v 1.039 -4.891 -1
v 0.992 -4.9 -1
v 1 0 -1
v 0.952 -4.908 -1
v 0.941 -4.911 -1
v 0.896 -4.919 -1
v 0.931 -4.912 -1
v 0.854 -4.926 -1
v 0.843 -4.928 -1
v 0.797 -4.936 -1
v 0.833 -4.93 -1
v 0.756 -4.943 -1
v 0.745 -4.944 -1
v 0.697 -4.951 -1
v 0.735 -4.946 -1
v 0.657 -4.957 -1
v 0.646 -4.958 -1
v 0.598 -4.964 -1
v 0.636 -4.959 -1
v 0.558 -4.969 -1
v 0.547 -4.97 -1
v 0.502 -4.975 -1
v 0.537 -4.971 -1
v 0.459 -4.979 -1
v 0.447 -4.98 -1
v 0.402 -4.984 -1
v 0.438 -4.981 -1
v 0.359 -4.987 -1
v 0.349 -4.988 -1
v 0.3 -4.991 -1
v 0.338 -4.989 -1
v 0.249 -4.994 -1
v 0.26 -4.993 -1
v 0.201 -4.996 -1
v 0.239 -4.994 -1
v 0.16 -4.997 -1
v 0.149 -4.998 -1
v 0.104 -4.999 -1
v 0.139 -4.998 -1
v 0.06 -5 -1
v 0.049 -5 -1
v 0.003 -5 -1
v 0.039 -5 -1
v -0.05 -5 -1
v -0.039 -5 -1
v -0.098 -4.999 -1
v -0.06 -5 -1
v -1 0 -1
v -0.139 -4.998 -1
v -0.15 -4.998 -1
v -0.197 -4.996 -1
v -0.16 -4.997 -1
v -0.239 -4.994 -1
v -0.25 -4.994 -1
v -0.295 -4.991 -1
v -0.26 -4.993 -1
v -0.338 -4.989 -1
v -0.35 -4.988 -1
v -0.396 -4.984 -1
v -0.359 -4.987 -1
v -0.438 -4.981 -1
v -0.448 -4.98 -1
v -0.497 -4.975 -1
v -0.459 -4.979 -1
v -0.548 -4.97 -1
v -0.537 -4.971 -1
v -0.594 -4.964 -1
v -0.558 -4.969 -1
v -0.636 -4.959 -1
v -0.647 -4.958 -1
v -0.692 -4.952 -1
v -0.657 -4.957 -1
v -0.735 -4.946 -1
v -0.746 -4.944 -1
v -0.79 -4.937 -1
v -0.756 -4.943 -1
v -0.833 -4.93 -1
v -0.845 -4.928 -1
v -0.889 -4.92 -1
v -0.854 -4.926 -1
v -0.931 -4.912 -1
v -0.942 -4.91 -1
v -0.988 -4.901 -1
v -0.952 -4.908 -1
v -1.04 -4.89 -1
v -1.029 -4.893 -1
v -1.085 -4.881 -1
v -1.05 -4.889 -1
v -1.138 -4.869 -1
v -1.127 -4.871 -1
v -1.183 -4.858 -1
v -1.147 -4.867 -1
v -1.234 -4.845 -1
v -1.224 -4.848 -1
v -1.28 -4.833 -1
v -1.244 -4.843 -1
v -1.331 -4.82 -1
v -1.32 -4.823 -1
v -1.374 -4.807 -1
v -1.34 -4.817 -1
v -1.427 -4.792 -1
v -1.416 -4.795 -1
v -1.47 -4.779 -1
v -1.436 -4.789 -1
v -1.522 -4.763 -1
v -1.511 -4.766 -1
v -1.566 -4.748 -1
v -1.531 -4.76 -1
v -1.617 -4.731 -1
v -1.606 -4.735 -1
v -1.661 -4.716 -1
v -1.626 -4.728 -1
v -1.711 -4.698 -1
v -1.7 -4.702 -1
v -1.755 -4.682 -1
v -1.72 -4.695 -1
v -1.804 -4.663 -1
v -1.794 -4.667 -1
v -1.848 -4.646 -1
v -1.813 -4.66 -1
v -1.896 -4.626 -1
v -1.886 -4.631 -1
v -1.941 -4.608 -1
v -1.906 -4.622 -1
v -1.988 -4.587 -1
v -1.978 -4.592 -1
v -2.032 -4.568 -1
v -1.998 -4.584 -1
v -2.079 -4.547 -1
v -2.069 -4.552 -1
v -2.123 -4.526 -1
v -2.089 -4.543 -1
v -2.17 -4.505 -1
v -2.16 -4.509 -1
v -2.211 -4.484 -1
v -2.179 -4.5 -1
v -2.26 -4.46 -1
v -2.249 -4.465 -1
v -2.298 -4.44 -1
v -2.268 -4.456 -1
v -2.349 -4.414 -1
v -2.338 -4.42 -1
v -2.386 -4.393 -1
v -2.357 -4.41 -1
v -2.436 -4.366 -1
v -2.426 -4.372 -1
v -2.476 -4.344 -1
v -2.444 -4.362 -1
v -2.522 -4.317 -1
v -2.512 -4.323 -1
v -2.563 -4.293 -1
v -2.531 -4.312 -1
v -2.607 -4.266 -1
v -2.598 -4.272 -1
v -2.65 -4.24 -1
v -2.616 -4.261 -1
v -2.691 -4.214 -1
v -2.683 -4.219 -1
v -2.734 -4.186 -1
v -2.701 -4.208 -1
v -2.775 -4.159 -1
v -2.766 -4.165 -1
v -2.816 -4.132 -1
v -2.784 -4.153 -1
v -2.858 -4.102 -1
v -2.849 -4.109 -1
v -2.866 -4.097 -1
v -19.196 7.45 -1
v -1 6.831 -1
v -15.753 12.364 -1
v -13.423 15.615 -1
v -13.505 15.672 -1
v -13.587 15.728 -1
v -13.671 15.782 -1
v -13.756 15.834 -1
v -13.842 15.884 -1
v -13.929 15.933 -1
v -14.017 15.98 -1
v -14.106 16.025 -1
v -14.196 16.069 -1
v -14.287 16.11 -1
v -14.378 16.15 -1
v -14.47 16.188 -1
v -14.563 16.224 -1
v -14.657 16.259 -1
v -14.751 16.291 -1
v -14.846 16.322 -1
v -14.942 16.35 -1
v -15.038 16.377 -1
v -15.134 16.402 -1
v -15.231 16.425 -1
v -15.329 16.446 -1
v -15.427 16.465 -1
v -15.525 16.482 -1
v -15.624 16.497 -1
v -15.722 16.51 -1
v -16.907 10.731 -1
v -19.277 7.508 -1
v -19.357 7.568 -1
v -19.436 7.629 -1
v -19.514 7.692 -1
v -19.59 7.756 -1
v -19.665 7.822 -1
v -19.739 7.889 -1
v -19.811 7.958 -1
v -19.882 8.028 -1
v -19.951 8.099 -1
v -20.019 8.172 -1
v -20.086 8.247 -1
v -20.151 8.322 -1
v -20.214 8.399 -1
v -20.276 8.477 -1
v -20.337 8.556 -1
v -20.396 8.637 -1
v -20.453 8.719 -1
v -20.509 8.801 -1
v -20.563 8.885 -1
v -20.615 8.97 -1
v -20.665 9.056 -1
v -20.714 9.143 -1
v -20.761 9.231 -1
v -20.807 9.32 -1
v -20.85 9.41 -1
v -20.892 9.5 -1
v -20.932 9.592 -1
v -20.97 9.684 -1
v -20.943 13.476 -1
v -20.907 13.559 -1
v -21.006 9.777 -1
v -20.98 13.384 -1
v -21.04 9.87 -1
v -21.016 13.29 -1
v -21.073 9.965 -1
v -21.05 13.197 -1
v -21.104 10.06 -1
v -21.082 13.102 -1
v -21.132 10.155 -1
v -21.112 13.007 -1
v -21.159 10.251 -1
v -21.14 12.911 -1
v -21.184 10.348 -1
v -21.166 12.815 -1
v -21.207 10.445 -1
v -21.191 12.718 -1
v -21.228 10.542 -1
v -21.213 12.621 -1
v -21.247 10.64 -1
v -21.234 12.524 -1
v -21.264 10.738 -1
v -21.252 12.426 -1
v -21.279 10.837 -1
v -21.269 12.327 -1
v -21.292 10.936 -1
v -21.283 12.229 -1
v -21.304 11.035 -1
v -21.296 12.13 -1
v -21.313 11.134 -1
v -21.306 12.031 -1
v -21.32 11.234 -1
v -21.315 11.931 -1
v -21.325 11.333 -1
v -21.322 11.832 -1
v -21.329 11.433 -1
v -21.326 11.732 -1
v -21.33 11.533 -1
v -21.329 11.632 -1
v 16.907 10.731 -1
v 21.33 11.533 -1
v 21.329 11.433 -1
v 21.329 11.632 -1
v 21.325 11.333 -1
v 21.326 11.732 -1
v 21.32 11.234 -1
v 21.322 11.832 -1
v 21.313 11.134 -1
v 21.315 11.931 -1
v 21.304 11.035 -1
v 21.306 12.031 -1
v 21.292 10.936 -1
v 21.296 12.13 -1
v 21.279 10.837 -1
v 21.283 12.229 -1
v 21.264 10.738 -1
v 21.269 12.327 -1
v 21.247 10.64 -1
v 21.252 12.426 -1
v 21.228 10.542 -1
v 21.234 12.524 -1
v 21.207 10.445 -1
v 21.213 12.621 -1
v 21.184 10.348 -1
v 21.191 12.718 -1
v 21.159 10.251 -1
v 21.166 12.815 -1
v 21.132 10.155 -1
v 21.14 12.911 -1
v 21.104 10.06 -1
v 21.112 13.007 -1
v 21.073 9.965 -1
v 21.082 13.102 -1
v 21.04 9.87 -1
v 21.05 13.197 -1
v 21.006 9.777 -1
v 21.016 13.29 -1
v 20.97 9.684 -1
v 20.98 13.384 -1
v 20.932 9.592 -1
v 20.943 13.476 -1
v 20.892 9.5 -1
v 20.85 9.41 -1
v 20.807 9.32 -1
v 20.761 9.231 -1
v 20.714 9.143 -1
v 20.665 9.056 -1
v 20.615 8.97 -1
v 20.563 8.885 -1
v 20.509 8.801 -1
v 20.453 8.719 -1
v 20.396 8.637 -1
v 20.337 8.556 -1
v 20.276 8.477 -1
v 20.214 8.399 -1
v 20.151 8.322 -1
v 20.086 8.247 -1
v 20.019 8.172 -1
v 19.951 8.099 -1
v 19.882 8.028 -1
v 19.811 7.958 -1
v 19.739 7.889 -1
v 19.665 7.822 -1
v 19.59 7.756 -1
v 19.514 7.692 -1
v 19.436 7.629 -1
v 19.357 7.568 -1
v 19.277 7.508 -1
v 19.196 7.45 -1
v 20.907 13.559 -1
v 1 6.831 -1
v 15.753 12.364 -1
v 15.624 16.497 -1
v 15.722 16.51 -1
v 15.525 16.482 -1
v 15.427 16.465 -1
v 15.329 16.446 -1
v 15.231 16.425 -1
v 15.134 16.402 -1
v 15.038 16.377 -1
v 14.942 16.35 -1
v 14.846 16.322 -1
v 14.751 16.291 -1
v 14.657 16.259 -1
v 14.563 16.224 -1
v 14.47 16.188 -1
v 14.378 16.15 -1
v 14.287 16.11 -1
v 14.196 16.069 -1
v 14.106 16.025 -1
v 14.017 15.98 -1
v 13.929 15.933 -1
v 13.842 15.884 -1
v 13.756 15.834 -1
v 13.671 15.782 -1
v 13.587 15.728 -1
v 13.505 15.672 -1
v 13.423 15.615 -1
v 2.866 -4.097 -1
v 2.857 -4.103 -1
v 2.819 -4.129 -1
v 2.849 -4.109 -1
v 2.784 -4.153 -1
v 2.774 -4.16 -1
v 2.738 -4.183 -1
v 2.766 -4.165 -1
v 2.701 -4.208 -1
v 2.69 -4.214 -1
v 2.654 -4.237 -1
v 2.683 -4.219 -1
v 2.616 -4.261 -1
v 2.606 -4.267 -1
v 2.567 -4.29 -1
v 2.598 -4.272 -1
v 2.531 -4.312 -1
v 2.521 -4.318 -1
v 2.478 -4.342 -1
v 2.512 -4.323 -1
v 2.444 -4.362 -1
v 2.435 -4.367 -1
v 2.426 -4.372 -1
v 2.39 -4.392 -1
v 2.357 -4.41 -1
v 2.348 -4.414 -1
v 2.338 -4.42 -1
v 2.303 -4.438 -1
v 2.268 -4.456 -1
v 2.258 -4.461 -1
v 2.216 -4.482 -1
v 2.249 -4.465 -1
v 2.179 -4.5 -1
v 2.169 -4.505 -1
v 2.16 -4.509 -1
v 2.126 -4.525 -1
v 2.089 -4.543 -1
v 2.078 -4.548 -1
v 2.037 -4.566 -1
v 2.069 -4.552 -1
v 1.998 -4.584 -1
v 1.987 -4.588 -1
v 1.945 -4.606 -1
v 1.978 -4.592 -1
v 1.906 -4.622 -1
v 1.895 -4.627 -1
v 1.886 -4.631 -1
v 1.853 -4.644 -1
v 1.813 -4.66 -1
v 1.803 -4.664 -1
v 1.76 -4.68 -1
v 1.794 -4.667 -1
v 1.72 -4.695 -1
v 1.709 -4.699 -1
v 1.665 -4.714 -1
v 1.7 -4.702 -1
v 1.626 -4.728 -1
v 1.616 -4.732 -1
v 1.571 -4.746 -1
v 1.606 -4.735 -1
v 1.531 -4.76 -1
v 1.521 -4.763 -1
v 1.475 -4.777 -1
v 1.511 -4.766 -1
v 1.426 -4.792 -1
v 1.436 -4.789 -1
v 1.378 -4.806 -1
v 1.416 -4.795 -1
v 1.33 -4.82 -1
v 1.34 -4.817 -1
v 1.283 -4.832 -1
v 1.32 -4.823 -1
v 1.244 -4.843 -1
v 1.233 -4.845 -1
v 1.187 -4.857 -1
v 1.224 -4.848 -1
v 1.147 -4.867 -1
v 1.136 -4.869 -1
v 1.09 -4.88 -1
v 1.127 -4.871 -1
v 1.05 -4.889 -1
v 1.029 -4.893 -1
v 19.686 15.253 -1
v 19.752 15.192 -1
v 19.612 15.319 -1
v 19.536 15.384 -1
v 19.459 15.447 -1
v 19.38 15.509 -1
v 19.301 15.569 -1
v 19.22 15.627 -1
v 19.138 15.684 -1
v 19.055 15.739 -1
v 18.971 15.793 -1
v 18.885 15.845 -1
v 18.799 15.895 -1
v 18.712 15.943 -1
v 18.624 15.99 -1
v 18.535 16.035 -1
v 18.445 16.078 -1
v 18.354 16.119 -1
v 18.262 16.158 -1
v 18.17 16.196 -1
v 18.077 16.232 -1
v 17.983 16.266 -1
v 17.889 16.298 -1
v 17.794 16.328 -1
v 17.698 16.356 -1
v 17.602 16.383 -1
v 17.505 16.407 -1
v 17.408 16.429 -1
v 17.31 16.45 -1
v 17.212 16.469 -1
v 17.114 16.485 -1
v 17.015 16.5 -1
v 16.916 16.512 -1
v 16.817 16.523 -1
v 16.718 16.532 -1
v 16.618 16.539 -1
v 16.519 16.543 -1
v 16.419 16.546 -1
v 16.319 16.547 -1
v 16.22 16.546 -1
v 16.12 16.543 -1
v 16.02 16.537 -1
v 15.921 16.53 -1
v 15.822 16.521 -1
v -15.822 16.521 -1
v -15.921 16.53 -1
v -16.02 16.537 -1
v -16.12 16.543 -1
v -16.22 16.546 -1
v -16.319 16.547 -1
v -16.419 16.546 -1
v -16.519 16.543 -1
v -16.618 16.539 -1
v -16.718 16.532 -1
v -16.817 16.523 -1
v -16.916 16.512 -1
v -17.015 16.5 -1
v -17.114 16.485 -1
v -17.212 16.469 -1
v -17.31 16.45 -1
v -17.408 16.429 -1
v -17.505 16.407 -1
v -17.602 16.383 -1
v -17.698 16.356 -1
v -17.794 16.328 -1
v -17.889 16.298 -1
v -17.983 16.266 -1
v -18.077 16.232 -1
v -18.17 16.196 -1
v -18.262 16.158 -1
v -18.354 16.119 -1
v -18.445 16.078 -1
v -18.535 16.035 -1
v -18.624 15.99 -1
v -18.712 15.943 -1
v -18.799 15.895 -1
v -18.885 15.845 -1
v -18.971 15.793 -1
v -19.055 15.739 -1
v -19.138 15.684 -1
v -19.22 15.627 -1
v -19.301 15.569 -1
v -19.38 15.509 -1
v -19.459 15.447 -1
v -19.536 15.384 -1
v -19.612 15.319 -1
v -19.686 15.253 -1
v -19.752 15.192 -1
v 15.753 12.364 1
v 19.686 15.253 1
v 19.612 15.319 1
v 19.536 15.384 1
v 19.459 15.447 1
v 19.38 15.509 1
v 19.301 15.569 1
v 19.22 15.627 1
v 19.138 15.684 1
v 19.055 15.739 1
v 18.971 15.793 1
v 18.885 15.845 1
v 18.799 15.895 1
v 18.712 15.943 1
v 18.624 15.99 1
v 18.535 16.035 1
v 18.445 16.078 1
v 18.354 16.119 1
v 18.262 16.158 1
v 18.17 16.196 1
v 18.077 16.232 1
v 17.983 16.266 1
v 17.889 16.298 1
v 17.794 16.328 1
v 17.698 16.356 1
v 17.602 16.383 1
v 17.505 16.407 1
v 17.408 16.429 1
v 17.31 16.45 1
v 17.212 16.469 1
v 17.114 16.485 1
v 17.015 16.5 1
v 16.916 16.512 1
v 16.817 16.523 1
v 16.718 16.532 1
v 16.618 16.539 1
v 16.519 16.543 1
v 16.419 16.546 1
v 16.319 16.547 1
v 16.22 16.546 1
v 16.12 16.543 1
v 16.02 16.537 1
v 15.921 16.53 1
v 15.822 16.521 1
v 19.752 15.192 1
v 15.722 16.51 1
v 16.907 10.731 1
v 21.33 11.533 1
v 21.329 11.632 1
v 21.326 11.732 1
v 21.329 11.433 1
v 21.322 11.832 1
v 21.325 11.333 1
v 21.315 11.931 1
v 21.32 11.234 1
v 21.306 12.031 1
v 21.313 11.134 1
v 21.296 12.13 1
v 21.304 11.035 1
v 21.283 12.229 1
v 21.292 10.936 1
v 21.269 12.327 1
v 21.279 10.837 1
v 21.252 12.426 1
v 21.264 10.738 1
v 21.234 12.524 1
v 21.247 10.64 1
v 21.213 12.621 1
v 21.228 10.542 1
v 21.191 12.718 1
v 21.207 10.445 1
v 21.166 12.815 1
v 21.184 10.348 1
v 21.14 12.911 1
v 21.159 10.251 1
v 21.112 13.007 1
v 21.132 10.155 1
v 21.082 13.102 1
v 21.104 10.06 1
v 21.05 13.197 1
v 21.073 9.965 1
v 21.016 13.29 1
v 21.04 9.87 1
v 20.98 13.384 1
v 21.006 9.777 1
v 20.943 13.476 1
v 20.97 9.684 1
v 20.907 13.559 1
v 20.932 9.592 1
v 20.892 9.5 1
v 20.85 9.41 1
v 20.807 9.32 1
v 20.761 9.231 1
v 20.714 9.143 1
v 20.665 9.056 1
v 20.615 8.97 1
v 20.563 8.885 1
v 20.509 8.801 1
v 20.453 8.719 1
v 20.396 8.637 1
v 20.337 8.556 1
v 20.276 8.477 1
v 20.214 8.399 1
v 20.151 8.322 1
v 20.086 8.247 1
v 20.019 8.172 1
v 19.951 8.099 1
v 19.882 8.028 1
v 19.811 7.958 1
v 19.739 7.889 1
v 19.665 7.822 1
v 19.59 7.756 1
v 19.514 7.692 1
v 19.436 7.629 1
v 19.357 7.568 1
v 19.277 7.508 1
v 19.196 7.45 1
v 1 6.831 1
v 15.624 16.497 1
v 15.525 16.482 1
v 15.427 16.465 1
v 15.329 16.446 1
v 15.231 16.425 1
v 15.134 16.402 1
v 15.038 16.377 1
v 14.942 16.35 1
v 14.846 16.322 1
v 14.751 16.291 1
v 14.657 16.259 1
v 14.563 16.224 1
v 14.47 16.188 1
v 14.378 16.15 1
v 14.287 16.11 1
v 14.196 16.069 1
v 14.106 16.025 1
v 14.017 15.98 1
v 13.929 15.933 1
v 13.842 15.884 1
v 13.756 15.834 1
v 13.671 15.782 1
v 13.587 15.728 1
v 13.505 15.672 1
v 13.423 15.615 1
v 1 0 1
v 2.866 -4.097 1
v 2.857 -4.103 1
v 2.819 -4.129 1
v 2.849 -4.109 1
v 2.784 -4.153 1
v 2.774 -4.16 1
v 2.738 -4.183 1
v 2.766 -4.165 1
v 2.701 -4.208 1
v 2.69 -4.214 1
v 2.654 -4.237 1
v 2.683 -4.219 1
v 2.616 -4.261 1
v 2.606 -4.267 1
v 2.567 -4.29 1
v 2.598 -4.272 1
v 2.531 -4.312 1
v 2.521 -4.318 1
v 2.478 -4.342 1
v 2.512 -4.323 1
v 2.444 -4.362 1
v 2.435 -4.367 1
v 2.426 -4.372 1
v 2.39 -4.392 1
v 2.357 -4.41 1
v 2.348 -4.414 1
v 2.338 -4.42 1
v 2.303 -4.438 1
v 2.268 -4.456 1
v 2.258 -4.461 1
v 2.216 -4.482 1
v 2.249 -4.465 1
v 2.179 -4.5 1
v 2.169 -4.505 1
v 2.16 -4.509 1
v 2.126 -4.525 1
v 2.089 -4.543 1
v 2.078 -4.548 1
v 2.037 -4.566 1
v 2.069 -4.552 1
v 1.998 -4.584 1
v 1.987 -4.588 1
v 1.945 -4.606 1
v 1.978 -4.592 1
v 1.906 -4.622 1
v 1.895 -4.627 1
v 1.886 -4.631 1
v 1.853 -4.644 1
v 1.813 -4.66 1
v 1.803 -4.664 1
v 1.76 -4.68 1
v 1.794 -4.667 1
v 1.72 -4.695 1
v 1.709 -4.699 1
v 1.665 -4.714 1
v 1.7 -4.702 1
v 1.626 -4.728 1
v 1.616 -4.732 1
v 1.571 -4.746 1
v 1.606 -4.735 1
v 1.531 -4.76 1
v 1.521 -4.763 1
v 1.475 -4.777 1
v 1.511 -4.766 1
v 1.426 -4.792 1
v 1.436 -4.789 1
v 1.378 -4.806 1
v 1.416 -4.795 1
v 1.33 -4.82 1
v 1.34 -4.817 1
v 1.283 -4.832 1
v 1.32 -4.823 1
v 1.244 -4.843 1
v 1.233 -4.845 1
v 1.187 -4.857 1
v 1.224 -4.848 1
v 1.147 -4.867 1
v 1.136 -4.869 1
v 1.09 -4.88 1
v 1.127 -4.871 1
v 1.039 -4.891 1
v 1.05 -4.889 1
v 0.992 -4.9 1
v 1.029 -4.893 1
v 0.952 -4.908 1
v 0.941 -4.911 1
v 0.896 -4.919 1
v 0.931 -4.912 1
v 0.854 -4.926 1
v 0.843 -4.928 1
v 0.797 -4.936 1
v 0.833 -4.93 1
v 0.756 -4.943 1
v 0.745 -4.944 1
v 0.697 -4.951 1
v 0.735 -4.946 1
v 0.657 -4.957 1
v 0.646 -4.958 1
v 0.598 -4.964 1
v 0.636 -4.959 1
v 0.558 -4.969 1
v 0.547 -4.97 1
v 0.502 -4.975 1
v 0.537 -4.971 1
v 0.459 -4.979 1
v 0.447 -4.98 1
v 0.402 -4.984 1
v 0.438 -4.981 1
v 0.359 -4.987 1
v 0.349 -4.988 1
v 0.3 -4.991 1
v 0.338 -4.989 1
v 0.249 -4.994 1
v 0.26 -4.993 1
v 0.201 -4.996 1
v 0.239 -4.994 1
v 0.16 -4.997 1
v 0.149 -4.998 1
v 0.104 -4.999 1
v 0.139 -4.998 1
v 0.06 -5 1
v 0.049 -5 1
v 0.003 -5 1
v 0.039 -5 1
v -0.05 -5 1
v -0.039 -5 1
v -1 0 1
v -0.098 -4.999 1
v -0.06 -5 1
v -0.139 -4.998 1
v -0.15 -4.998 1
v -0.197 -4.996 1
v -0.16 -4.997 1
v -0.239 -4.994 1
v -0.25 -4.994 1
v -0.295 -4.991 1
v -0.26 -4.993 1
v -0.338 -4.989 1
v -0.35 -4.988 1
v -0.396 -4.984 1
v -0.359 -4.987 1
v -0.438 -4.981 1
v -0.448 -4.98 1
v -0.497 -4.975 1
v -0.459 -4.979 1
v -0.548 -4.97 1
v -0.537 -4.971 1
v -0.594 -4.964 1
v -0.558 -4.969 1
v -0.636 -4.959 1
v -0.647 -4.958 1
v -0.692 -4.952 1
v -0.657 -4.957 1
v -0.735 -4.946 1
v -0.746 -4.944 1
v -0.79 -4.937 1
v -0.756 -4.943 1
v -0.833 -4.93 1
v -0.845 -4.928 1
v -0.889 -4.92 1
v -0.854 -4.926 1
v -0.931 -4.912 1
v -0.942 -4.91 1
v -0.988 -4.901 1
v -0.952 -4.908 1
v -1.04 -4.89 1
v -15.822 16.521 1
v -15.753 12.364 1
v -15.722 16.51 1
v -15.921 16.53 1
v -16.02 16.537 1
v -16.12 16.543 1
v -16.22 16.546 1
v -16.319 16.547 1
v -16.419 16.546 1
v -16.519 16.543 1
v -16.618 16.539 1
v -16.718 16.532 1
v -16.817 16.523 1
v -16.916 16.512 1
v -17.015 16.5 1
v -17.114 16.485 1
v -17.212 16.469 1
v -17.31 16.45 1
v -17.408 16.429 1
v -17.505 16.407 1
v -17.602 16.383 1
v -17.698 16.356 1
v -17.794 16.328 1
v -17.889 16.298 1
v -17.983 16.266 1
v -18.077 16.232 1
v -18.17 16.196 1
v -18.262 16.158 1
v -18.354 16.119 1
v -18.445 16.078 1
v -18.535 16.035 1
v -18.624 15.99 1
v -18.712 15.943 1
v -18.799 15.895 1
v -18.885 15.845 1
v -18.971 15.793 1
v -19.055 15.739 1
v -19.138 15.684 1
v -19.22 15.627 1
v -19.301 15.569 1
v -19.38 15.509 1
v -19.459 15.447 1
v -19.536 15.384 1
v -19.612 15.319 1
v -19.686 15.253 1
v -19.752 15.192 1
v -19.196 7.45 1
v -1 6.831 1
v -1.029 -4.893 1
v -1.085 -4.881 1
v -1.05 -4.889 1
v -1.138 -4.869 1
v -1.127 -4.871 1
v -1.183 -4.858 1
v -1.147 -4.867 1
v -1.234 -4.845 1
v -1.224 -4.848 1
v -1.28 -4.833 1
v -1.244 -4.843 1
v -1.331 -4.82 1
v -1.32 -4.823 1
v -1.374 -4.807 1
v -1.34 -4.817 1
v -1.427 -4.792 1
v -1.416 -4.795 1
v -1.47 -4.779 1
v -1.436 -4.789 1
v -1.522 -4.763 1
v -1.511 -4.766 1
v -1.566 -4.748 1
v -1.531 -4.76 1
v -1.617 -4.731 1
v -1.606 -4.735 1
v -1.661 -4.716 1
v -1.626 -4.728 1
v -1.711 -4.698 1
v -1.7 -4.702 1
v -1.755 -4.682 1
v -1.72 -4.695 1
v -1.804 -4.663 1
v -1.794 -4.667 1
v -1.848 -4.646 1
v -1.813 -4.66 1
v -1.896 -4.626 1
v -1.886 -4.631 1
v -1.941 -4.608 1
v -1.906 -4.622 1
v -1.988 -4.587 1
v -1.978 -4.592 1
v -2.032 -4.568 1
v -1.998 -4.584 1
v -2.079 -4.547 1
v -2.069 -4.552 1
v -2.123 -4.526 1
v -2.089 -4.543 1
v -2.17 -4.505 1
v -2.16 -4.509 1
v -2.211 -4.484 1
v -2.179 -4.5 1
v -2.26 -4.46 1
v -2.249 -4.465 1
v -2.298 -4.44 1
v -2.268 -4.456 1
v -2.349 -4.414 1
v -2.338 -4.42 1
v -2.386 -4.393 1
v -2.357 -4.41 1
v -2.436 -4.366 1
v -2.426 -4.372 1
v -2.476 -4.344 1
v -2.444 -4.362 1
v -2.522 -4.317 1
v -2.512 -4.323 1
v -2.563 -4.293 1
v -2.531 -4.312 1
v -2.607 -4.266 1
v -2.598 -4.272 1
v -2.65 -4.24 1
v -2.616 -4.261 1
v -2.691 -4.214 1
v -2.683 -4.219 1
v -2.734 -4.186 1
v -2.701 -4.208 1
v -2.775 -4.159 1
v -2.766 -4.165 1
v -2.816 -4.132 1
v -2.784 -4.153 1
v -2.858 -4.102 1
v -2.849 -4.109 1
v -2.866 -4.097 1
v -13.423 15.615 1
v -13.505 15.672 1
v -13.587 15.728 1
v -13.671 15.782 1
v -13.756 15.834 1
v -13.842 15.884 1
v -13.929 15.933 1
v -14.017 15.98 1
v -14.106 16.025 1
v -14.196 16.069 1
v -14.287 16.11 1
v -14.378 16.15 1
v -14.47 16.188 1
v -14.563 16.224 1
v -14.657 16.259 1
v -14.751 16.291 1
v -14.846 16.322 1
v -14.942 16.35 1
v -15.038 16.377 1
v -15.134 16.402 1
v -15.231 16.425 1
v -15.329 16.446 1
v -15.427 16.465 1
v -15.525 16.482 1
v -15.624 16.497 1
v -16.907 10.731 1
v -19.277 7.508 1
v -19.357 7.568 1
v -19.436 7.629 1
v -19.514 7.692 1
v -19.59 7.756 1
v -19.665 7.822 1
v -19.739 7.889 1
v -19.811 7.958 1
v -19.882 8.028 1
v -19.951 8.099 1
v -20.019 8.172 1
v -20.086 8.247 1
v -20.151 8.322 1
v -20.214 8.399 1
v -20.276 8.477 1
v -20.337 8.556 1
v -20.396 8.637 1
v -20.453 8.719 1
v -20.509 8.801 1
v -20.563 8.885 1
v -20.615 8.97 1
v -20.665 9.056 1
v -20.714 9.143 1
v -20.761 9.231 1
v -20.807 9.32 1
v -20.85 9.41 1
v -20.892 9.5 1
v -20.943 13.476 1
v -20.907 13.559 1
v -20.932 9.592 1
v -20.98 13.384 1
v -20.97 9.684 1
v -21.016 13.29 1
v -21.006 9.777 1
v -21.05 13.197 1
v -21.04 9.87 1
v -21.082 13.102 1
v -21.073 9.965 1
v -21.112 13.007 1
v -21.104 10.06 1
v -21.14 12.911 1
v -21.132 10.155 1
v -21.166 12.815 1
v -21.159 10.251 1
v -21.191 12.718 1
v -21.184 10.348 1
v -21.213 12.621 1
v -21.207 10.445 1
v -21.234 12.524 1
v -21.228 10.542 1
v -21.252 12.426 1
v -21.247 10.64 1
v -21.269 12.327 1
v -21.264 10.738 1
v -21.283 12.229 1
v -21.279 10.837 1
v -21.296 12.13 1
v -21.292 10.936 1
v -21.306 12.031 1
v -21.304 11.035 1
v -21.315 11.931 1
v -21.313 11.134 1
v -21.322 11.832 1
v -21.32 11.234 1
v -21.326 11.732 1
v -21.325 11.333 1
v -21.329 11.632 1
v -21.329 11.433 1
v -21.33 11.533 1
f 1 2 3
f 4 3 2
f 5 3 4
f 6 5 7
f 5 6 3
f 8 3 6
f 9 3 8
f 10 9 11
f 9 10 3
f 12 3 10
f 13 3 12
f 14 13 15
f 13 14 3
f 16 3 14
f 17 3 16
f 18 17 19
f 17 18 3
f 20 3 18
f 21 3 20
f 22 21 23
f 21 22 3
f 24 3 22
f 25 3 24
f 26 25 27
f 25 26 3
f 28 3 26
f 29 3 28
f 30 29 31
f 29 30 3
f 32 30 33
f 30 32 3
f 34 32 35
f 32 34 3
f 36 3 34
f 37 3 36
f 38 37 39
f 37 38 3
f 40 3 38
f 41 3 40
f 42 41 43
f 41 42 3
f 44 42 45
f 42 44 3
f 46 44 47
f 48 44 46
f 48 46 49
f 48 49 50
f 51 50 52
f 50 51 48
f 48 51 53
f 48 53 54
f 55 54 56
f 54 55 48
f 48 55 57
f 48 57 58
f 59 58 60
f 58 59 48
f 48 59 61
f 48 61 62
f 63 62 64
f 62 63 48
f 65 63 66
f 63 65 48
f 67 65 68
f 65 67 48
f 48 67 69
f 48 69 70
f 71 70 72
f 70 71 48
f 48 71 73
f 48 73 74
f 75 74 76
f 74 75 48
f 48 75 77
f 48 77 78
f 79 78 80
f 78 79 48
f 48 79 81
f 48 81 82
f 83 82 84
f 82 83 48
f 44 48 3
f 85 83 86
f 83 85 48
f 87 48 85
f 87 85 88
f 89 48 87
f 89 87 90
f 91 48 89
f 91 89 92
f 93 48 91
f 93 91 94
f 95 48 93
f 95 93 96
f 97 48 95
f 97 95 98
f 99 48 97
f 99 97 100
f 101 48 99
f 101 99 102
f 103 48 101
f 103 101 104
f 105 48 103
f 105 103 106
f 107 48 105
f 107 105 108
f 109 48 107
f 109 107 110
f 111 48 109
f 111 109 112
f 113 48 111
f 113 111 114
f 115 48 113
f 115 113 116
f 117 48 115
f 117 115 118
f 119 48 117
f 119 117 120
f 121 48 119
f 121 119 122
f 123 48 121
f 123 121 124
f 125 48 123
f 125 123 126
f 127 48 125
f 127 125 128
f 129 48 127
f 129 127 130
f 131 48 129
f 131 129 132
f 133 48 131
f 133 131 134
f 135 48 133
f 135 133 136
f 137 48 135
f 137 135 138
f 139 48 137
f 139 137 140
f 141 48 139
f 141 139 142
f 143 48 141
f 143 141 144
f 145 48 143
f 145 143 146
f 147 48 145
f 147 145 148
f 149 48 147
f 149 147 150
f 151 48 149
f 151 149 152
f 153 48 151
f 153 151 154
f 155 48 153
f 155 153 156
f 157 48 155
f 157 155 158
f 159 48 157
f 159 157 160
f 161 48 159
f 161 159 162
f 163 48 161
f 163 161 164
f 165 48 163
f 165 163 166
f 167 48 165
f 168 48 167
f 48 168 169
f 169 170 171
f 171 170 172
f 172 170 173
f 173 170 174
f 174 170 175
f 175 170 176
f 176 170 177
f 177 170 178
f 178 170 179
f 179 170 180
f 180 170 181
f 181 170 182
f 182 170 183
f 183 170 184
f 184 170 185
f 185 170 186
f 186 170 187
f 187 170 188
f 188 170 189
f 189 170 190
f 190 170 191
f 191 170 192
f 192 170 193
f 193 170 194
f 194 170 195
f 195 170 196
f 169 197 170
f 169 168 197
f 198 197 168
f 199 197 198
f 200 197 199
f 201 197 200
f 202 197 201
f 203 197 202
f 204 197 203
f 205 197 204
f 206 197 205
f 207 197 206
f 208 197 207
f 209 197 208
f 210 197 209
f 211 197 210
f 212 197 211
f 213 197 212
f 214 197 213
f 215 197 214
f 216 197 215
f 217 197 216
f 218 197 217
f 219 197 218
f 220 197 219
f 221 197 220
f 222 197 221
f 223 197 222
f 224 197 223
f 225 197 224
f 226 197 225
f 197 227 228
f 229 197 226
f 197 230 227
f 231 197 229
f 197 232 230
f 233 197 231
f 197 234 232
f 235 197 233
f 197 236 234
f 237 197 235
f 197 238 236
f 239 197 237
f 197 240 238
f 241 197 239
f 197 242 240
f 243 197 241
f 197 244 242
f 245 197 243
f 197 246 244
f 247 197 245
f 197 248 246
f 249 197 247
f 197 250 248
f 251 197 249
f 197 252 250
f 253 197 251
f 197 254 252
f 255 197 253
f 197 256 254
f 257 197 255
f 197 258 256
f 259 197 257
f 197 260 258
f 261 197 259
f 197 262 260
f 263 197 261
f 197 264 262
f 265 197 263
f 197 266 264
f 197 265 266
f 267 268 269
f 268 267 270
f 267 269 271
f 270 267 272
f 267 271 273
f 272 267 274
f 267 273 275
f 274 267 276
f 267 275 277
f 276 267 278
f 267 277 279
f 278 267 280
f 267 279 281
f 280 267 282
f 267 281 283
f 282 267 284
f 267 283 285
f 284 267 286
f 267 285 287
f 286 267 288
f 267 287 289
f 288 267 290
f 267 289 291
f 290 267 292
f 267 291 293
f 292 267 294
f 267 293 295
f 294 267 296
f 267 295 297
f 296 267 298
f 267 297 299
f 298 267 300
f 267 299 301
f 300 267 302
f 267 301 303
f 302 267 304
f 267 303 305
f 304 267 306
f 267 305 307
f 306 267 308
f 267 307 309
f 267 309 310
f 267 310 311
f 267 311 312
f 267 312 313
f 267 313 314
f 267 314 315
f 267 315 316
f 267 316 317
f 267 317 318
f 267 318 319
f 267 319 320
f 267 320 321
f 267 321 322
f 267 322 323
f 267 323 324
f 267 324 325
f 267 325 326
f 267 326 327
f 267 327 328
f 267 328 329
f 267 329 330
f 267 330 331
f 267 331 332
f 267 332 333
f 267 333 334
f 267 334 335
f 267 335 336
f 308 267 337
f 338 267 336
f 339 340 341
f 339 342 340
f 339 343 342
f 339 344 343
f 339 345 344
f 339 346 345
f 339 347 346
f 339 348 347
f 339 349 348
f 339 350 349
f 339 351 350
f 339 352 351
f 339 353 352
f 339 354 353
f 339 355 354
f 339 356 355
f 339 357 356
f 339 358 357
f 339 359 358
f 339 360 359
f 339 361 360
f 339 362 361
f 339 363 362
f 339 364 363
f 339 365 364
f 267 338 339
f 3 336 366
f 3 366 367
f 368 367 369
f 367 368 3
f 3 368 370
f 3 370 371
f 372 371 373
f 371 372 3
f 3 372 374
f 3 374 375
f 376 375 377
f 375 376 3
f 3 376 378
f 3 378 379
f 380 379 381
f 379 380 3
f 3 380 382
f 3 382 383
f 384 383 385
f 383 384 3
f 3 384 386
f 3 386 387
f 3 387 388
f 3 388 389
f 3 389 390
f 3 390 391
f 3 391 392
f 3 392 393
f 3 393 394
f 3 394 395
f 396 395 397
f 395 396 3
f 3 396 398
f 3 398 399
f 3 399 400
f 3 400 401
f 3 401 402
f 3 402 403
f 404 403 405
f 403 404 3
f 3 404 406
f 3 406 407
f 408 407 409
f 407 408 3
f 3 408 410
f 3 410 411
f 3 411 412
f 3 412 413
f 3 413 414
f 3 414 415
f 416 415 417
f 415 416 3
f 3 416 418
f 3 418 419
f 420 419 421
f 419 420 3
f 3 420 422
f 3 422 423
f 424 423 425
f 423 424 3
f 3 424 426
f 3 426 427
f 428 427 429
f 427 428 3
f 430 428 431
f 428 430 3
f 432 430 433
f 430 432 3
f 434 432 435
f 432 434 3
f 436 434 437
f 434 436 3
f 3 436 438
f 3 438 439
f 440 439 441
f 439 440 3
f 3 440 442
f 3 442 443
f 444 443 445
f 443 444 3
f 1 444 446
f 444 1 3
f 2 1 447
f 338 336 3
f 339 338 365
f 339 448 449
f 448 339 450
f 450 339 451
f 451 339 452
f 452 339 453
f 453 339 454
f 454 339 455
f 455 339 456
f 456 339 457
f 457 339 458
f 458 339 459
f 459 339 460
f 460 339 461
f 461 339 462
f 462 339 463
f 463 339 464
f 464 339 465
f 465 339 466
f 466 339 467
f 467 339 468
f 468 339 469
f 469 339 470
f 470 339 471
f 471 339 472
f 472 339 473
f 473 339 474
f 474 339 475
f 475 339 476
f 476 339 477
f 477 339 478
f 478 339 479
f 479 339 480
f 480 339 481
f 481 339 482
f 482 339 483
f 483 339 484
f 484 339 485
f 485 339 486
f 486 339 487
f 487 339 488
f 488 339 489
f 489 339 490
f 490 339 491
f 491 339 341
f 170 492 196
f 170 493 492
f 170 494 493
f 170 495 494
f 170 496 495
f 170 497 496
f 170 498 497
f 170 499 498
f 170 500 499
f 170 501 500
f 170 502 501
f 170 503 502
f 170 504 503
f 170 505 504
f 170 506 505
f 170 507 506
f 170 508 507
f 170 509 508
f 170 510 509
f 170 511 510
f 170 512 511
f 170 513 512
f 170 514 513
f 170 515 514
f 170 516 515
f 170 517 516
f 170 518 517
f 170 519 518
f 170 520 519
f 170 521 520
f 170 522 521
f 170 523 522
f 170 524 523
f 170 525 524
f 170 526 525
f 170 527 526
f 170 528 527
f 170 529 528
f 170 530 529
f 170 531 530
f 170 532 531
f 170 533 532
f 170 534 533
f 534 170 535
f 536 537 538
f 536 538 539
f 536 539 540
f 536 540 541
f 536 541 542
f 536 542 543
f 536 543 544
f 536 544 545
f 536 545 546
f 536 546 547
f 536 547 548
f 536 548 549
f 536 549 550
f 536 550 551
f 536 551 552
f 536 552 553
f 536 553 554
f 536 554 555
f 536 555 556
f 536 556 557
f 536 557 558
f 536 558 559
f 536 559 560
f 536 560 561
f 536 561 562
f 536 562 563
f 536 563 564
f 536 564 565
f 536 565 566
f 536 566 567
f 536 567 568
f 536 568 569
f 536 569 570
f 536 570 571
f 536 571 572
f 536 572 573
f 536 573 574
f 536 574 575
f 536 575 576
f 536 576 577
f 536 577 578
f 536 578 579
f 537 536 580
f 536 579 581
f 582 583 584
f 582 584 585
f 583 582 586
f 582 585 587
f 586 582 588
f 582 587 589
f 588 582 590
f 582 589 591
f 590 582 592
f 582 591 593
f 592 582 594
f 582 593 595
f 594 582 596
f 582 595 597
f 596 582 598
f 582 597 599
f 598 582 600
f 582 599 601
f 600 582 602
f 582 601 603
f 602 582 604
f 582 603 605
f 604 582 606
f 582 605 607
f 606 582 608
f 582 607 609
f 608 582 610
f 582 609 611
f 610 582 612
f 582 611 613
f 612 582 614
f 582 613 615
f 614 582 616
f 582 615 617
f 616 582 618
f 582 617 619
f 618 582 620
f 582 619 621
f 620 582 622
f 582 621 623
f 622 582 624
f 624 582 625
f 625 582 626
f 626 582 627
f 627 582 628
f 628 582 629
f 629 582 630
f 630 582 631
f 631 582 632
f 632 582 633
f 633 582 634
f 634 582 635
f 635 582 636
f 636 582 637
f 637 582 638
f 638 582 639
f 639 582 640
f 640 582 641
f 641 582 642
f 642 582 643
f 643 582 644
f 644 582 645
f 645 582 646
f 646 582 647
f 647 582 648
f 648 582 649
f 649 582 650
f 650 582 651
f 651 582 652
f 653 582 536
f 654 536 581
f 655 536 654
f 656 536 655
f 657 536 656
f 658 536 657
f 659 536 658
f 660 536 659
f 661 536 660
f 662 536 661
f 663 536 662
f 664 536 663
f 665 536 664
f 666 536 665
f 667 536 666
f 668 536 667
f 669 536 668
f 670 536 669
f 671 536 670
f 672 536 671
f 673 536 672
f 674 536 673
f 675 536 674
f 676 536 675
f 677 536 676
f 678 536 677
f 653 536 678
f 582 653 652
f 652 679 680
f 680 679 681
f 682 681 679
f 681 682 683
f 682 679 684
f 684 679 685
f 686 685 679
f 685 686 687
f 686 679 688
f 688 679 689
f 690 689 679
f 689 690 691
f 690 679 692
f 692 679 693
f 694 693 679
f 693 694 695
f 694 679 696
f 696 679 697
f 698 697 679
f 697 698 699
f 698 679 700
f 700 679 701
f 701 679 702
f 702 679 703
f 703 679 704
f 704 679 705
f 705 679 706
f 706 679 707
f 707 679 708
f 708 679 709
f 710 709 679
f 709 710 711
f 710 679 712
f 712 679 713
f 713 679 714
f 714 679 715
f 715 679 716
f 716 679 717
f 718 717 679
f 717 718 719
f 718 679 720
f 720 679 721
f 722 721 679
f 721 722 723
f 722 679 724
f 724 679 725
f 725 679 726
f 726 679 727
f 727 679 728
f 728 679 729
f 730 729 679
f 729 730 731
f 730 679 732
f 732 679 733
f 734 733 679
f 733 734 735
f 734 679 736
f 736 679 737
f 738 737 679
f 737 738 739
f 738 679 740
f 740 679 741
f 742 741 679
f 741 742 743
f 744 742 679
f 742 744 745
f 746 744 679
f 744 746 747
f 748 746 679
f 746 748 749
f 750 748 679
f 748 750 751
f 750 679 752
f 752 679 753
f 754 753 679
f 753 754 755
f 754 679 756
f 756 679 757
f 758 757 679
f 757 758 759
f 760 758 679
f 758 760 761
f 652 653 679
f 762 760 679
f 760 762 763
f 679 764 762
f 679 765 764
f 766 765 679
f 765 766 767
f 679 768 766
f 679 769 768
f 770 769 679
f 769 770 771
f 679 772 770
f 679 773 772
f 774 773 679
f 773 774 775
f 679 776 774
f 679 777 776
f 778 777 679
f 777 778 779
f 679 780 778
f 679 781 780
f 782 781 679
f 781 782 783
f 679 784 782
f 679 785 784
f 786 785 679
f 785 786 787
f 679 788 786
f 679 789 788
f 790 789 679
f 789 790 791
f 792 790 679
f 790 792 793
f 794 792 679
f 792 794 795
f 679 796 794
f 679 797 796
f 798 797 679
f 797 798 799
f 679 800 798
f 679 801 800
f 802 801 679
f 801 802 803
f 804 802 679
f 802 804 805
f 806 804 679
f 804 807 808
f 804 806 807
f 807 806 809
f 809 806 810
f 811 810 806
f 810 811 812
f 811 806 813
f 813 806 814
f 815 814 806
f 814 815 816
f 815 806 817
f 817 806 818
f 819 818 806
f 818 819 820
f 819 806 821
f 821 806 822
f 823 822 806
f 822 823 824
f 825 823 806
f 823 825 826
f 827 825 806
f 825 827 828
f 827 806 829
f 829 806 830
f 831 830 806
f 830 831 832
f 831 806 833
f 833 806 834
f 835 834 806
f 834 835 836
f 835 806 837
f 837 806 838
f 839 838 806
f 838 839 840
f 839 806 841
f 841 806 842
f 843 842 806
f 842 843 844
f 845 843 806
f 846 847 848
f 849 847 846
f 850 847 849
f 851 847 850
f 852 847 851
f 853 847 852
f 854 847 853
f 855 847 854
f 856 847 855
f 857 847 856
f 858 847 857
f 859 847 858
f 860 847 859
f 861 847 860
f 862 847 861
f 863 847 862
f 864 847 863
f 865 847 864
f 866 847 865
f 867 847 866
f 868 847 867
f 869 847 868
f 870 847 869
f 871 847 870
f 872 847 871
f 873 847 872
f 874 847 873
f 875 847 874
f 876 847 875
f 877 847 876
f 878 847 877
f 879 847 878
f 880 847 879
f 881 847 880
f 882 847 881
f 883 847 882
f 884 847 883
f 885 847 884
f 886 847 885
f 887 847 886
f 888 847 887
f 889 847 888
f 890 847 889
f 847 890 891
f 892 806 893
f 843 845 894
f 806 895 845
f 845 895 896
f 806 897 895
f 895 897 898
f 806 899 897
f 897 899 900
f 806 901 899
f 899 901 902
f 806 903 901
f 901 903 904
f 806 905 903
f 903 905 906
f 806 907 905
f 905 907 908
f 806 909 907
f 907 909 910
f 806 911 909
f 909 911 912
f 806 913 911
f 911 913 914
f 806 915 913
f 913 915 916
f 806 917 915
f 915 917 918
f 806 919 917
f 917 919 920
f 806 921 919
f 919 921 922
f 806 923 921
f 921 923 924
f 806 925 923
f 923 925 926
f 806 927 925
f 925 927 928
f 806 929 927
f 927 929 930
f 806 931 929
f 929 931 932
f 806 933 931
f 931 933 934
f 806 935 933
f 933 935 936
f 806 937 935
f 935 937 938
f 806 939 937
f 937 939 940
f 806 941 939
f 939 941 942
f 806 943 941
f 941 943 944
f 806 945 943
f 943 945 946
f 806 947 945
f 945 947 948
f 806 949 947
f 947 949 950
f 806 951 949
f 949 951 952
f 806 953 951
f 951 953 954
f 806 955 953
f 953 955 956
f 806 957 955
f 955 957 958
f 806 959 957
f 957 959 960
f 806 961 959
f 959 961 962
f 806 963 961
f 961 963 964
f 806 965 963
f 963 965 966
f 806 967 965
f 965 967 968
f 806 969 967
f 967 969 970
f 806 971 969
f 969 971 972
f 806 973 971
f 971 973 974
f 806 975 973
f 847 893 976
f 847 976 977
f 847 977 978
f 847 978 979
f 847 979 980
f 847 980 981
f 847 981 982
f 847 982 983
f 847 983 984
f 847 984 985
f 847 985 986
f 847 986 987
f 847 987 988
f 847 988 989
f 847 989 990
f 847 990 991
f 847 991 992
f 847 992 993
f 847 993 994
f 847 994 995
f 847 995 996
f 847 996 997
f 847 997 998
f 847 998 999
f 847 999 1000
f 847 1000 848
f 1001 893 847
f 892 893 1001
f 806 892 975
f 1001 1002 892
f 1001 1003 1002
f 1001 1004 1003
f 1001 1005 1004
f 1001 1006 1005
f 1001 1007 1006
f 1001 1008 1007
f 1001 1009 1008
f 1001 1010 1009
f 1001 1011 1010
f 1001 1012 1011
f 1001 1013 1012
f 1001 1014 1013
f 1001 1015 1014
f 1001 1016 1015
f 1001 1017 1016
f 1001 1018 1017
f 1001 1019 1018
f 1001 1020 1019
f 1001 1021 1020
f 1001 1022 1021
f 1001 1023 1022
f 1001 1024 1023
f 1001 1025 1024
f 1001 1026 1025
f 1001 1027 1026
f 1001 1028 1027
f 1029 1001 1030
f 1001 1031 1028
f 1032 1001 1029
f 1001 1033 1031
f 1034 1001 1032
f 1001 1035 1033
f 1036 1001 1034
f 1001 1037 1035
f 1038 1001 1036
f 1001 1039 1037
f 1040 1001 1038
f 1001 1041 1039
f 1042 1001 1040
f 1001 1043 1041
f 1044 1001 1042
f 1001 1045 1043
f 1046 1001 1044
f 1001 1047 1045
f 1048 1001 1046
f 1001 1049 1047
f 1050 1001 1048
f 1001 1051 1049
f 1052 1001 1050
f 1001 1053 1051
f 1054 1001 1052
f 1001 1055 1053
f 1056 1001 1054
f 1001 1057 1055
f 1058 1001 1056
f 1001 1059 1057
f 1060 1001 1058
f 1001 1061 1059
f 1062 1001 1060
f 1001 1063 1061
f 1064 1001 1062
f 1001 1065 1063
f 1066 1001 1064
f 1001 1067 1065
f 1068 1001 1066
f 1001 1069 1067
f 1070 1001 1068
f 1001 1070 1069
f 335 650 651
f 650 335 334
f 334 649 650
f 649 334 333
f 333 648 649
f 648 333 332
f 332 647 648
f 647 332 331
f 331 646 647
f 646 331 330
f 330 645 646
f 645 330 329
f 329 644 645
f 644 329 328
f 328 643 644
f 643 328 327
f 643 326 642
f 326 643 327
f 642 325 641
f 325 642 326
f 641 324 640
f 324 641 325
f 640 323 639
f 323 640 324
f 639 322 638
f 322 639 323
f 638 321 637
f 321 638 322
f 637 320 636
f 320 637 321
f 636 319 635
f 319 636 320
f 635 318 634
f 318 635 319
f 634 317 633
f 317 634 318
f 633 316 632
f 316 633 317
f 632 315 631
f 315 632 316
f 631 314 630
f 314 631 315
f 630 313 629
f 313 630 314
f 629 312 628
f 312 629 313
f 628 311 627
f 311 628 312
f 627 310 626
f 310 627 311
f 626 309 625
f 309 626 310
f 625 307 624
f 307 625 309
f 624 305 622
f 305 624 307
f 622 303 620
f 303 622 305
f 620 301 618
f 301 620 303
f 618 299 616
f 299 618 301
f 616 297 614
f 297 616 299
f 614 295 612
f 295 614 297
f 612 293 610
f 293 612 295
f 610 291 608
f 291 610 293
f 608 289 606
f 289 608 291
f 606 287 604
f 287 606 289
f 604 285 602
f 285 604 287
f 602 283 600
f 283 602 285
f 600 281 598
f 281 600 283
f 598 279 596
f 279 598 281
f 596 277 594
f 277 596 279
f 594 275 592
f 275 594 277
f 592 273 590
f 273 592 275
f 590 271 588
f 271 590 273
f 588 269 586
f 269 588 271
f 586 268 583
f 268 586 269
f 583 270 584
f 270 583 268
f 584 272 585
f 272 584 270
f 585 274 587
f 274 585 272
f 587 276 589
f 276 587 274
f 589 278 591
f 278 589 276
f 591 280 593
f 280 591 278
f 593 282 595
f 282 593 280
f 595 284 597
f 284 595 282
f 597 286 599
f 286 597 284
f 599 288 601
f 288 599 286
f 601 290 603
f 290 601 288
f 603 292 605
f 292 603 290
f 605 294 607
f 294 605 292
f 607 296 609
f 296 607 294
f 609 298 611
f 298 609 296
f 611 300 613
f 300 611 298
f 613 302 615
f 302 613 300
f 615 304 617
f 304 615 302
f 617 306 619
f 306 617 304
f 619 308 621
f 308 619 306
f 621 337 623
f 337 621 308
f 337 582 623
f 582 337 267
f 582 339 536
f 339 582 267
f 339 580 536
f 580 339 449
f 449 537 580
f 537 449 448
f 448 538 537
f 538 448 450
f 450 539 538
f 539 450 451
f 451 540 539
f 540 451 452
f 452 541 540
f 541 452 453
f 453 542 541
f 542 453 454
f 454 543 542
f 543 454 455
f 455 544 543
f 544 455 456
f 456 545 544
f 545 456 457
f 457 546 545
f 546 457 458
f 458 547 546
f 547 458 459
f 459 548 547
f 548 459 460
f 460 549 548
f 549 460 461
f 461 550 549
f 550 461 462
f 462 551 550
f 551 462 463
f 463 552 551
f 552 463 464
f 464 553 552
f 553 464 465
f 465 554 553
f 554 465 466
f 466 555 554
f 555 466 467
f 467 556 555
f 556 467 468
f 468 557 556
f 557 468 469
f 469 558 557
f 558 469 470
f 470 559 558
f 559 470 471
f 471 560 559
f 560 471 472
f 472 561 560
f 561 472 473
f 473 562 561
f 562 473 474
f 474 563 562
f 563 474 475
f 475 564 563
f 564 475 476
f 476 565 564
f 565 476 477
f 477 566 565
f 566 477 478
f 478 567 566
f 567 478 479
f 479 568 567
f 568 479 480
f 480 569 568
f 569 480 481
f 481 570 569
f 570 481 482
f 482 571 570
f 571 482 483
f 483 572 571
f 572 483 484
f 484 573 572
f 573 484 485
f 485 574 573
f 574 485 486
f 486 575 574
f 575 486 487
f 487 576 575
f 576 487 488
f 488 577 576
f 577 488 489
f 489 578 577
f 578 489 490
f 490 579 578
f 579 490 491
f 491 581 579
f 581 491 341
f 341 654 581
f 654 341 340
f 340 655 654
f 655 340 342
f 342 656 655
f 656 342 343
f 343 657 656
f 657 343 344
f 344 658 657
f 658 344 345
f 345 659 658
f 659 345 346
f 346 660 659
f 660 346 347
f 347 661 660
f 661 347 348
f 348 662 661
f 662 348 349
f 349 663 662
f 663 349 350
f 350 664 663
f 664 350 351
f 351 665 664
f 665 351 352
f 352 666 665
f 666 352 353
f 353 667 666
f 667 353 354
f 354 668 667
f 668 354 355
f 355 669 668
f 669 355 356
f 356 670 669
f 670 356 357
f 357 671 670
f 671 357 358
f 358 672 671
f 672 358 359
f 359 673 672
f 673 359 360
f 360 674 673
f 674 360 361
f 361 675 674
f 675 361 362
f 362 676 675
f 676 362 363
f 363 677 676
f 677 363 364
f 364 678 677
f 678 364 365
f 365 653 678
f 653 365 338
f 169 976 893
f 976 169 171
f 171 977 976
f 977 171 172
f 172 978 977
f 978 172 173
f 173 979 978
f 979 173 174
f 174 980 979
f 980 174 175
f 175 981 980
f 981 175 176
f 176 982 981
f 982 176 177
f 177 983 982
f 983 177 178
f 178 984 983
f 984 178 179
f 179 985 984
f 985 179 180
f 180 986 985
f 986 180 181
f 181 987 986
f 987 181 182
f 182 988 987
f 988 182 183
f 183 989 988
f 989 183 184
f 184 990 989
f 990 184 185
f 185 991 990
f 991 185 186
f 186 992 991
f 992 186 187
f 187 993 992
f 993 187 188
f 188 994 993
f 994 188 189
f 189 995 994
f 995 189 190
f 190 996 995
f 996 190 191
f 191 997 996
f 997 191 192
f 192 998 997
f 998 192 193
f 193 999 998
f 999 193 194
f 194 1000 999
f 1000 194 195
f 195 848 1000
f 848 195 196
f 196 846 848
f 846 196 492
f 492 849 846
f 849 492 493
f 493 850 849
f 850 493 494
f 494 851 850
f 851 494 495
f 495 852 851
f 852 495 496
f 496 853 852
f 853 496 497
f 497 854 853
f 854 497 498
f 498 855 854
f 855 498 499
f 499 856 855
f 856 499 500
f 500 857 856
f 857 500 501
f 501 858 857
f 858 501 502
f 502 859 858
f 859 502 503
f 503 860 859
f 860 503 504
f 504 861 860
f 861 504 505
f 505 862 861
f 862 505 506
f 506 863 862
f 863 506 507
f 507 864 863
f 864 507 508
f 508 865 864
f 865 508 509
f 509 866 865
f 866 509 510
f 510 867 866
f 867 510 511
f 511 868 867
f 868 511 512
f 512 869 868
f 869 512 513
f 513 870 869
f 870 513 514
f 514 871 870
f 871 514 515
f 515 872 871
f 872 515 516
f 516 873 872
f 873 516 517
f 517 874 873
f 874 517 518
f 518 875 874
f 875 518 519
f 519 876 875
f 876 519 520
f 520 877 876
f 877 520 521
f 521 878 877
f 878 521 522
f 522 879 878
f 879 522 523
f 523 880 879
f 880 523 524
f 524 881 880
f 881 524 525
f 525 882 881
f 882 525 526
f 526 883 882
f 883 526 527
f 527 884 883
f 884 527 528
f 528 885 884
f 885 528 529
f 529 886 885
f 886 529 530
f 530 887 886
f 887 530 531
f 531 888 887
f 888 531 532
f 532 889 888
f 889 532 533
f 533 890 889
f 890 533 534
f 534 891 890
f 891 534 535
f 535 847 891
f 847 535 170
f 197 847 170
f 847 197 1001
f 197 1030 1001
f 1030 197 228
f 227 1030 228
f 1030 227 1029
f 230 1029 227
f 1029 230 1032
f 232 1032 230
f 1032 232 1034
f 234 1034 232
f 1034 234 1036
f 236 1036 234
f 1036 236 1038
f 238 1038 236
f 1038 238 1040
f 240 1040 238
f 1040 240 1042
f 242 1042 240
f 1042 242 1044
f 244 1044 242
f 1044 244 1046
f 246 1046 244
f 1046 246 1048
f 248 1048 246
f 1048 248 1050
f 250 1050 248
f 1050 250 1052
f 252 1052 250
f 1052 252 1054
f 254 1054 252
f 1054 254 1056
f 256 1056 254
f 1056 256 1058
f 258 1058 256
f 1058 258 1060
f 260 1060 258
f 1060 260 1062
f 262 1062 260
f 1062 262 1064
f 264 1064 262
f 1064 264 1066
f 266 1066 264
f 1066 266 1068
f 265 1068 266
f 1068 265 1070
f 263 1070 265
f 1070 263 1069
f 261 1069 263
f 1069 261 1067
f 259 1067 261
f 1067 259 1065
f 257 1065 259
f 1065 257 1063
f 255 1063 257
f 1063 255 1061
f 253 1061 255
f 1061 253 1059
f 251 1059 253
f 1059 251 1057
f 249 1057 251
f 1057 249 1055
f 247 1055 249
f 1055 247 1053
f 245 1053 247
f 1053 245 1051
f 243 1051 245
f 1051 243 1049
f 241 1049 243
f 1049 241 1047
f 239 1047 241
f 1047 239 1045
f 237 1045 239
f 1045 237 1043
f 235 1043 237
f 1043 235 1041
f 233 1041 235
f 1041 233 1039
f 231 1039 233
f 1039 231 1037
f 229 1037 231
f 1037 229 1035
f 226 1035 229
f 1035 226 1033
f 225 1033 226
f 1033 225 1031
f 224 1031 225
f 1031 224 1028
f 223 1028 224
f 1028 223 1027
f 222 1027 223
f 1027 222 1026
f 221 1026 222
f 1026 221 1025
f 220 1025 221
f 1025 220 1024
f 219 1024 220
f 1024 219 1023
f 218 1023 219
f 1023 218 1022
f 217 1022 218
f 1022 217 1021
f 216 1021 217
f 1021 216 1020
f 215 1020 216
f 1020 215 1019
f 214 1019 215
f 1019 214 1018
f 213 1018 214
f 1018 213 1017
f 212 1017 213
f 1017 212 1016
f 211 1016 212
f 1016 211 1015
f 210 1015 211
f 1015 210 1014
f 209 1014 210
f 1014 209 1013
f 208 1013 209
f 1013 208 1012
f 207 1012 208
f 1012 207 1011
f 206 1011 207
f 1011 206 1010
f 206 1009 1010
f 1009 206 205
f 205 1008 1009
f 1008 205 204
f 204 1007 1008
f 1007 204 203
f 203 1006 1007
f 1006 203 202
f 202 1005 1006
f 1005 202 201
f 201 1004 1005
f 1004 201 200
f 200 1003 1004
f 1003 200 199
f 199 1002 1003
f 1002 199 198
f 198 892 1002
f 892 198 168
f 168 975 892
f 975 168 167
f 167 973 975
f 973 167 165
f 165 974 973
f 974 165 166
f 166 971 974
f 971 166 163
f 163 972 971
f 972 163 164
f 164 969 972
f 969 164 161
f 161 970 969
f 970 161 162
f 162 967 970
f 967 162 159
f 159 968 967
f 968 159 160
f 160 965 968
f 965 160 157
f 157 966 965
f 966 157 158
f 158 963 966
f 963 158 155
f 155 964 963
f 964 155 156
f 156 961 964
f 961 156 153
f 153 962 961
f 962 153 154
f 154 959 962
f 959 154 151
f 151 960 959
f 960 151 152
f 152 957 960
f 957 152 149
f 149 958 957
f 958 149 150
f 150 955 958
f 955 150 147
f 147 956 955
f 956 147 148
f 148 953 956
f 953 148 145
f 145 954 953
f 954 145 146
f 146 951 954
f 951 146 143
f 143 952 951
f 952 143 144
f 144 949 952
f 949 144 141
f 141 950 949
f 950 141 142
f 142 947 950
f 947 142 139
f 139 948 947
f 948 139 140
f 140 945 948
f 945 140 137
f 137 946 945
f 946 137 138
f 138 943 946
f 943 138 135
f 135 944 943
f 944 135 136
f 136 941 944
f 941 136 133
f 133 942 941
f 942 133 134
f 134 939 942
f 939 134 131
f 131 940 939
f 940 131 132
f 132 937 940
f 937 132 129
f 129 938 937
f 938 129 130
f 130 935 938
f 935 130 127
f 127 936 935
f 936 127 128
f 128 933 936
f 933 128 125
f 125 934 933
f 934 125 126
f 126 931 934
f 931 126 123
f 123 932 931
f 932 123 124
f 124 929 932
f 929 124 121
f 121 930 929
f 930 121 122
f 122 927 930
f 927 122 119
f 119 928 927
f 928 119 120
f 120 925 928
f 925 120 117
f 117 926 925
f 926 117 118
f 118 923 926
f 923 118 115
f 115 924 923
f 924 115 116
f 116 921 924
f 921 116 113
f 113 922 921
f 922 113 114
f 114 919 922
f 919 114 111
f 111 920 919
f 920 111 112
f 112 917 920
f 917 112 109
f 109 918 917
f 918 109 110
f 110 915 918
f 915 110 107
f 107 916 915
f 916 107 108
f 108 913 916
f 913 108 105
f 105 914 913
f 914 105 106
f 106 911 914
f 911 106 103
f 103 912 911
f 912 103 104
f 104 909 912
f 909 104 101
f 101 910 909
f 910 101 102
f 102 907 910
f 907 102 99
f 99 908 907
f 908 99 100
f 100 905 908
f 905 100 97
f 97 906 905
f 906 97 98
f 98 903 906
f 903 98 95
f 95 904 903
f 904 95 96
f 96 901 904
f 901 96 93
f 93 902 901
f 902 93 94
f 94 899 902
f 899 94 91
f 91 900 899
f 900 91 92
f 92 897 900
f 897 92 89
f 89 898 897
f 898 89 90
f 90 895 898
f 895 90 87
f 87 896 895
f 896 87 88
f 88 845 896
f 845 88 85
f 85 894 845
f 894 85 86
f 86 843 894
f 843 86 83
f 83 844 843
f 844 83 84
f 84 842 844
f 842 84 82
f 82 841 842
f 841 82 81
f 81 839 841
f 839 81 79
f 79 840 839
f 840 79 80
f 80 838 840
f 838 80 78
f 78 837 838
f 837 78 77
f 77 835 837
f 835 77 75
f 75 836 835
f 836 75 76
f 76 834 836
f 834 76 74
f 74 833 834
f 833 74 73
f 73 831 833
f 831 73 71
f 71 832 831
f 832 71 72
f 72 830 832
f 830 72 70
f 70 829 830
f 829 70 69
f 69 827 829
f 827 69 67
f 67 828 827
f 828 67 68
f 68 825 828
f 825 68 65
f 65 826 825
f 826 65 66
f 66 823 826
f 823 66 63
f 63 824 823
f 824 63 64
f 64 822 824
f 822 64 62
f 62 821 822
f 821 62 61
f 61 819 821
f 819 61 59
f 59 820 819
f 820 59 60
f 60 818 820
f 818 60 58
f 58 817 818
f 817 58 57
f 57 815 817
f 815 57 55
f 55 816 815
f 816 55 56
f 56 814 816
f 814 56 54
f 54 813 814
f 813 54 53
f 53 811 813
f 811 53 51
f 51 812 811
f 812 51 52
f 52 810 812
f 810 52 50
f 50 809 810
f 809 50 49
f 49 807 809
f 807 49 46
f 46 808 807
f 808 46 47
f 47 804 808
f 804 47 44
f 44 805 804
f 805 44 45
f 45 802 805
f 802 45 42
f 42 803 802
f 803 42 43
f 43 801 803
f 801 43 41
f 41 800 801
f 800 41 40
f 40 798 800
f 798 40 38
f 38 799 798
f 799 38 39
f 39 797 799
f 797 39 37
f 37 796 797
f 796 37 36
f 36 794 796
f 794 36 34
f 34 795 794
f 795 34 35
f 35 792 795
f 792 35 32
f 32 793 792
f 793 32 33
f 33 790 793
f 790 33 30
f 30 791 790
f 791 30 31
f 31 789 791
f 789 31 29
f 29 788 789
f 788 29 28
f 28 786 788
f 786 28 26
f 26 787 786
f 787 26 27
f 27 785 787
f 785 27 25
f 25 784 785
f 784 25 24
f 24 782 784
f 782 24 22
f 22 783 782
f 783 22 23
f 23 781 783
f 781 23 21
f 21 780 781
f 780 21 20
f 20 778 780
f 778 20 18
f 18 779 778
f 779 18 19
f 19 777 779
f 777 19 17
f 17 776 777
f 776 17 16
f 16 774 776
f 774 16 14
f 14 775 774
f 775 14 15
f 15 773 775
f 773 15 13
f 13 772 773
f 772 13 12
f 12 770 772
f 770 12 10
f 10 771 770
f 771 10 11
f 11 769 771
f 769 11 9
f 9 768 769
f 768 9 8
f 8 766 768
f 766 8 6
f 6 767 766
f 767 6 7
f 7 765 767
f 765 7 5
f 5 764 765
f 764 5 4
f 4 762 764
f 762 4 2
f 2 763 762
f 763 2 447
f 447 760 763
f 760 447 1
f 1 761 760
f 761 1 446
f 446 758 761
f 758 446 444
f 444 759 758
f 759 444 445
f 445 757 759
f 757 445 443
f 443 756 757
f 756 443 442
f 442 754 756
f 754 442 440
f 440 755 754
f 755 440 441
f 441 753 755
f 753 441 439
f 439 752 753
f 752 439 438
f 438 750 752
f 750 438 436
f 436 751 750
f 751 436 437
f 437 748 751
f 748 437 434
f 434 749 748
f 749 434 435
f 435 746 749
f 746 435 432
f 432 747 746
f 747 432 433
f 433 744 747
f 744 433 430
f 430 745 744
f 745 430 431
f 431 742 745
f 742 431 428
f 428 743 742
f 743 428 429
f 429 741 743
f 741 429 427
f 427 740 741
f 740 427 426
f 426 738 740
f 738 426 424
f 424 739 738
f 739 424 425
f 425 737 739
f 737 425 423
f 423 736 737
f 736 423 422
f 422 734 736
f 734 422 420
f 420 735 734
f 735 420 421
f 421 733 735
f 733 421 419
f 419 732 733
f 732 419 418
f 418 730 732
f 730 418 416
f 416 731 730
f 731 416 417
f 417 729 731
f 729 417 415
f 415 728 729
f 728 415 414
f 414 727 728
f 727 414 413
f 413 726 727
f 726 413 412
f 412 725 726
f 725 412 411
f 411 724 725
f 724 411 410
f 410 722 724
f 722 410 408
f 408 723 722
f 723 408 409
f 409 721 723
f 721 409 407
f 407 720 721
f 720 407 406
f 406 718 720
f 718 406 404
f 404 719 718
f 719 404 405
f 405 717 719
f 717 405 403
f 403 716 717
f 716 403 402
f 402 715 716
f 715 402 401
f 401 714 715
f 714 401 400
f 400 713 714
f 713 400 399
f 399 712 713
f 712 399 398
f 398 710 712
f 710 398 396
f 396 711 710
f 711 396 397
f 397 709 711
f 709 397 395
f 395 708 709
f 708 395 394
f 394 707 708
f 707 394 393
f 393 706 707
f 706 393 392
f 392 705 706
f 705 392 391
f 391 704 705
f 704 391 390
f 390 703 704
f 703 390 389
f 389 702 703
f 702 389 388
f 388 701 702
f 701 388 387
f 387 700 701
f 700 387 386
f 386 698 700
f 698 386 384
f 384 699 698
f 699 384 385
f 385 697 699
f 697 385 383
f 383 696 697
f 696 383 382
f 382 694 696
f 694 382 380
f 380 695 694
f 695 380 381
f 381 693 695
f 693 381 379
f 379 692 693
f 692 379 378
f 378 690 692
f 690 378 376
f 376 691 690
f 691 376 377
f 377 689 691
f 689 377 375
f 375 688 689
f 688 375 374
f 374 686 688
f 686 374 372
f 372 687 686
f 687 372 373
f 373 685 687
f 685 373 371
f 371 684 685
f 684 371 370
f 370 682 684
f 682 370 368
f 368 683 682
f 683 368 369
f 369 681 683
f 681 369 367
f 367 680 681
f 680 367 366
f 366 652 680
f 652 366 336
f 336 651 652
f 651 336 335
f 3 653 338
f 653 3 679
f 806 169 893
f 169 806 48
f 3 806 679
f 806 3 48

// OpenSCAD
// --- BUILD TYPE ---

// 1: Strut
// 2: Connector
// 3: Both
PART = 1;

// --- CONFIG ---

LEN_STRUT = 20;
LEN_CON = 10;
WIDTH = 10;
HEIGHT = 2;

$fa = 0.01;
$fs = 0.1;

// --- BUILD ---

if (PART % 2 == 1)
  part();

if (floor(PART / 2) % 2 == 1)
  connector();

// --- STUFF ---

module leg() {
  difference() {
    hull() {
      circle(WIDTH/2);
      translate([LEN_STRUT, 0])
      circle(WIDTH / 2);
    }
    translate([LEN_STRUT + WIDTH / 2, 0])
    square([WIDTH, HEIGHT], center=true);
  }
}

module connector() {
  translate([0, WIDTH * 1.5, 0])
  rotate([0, 0, 90])
  linear_extrude(height=HEIGHT, center=true)
  difference() {
    hull() {
      circle(WIDTH / 2);
      translate([LEN_CON, 0])
      circle(WIDTH / 2);
    }
    translate([-WIDTH / 2, 0])
    square([WIDTH, HEIGHT], center=true);
    translate([LEN_CON + WIDTH / 2, 0])
    square([WIDTH, HEIGHT], center=true);
  }
}

module part() {
  a = acos(-1 / 3);
  difference() {
    rotate([0, 0, 90 - a / 2])
    linear_extrude(height=HEIGHT, center=true) {
      leg();
      rotate(a)
      leg();
    }
  translate([0, 5, 0])
  cube([HEIGHT, 10, 10], center=true);
  }
}
